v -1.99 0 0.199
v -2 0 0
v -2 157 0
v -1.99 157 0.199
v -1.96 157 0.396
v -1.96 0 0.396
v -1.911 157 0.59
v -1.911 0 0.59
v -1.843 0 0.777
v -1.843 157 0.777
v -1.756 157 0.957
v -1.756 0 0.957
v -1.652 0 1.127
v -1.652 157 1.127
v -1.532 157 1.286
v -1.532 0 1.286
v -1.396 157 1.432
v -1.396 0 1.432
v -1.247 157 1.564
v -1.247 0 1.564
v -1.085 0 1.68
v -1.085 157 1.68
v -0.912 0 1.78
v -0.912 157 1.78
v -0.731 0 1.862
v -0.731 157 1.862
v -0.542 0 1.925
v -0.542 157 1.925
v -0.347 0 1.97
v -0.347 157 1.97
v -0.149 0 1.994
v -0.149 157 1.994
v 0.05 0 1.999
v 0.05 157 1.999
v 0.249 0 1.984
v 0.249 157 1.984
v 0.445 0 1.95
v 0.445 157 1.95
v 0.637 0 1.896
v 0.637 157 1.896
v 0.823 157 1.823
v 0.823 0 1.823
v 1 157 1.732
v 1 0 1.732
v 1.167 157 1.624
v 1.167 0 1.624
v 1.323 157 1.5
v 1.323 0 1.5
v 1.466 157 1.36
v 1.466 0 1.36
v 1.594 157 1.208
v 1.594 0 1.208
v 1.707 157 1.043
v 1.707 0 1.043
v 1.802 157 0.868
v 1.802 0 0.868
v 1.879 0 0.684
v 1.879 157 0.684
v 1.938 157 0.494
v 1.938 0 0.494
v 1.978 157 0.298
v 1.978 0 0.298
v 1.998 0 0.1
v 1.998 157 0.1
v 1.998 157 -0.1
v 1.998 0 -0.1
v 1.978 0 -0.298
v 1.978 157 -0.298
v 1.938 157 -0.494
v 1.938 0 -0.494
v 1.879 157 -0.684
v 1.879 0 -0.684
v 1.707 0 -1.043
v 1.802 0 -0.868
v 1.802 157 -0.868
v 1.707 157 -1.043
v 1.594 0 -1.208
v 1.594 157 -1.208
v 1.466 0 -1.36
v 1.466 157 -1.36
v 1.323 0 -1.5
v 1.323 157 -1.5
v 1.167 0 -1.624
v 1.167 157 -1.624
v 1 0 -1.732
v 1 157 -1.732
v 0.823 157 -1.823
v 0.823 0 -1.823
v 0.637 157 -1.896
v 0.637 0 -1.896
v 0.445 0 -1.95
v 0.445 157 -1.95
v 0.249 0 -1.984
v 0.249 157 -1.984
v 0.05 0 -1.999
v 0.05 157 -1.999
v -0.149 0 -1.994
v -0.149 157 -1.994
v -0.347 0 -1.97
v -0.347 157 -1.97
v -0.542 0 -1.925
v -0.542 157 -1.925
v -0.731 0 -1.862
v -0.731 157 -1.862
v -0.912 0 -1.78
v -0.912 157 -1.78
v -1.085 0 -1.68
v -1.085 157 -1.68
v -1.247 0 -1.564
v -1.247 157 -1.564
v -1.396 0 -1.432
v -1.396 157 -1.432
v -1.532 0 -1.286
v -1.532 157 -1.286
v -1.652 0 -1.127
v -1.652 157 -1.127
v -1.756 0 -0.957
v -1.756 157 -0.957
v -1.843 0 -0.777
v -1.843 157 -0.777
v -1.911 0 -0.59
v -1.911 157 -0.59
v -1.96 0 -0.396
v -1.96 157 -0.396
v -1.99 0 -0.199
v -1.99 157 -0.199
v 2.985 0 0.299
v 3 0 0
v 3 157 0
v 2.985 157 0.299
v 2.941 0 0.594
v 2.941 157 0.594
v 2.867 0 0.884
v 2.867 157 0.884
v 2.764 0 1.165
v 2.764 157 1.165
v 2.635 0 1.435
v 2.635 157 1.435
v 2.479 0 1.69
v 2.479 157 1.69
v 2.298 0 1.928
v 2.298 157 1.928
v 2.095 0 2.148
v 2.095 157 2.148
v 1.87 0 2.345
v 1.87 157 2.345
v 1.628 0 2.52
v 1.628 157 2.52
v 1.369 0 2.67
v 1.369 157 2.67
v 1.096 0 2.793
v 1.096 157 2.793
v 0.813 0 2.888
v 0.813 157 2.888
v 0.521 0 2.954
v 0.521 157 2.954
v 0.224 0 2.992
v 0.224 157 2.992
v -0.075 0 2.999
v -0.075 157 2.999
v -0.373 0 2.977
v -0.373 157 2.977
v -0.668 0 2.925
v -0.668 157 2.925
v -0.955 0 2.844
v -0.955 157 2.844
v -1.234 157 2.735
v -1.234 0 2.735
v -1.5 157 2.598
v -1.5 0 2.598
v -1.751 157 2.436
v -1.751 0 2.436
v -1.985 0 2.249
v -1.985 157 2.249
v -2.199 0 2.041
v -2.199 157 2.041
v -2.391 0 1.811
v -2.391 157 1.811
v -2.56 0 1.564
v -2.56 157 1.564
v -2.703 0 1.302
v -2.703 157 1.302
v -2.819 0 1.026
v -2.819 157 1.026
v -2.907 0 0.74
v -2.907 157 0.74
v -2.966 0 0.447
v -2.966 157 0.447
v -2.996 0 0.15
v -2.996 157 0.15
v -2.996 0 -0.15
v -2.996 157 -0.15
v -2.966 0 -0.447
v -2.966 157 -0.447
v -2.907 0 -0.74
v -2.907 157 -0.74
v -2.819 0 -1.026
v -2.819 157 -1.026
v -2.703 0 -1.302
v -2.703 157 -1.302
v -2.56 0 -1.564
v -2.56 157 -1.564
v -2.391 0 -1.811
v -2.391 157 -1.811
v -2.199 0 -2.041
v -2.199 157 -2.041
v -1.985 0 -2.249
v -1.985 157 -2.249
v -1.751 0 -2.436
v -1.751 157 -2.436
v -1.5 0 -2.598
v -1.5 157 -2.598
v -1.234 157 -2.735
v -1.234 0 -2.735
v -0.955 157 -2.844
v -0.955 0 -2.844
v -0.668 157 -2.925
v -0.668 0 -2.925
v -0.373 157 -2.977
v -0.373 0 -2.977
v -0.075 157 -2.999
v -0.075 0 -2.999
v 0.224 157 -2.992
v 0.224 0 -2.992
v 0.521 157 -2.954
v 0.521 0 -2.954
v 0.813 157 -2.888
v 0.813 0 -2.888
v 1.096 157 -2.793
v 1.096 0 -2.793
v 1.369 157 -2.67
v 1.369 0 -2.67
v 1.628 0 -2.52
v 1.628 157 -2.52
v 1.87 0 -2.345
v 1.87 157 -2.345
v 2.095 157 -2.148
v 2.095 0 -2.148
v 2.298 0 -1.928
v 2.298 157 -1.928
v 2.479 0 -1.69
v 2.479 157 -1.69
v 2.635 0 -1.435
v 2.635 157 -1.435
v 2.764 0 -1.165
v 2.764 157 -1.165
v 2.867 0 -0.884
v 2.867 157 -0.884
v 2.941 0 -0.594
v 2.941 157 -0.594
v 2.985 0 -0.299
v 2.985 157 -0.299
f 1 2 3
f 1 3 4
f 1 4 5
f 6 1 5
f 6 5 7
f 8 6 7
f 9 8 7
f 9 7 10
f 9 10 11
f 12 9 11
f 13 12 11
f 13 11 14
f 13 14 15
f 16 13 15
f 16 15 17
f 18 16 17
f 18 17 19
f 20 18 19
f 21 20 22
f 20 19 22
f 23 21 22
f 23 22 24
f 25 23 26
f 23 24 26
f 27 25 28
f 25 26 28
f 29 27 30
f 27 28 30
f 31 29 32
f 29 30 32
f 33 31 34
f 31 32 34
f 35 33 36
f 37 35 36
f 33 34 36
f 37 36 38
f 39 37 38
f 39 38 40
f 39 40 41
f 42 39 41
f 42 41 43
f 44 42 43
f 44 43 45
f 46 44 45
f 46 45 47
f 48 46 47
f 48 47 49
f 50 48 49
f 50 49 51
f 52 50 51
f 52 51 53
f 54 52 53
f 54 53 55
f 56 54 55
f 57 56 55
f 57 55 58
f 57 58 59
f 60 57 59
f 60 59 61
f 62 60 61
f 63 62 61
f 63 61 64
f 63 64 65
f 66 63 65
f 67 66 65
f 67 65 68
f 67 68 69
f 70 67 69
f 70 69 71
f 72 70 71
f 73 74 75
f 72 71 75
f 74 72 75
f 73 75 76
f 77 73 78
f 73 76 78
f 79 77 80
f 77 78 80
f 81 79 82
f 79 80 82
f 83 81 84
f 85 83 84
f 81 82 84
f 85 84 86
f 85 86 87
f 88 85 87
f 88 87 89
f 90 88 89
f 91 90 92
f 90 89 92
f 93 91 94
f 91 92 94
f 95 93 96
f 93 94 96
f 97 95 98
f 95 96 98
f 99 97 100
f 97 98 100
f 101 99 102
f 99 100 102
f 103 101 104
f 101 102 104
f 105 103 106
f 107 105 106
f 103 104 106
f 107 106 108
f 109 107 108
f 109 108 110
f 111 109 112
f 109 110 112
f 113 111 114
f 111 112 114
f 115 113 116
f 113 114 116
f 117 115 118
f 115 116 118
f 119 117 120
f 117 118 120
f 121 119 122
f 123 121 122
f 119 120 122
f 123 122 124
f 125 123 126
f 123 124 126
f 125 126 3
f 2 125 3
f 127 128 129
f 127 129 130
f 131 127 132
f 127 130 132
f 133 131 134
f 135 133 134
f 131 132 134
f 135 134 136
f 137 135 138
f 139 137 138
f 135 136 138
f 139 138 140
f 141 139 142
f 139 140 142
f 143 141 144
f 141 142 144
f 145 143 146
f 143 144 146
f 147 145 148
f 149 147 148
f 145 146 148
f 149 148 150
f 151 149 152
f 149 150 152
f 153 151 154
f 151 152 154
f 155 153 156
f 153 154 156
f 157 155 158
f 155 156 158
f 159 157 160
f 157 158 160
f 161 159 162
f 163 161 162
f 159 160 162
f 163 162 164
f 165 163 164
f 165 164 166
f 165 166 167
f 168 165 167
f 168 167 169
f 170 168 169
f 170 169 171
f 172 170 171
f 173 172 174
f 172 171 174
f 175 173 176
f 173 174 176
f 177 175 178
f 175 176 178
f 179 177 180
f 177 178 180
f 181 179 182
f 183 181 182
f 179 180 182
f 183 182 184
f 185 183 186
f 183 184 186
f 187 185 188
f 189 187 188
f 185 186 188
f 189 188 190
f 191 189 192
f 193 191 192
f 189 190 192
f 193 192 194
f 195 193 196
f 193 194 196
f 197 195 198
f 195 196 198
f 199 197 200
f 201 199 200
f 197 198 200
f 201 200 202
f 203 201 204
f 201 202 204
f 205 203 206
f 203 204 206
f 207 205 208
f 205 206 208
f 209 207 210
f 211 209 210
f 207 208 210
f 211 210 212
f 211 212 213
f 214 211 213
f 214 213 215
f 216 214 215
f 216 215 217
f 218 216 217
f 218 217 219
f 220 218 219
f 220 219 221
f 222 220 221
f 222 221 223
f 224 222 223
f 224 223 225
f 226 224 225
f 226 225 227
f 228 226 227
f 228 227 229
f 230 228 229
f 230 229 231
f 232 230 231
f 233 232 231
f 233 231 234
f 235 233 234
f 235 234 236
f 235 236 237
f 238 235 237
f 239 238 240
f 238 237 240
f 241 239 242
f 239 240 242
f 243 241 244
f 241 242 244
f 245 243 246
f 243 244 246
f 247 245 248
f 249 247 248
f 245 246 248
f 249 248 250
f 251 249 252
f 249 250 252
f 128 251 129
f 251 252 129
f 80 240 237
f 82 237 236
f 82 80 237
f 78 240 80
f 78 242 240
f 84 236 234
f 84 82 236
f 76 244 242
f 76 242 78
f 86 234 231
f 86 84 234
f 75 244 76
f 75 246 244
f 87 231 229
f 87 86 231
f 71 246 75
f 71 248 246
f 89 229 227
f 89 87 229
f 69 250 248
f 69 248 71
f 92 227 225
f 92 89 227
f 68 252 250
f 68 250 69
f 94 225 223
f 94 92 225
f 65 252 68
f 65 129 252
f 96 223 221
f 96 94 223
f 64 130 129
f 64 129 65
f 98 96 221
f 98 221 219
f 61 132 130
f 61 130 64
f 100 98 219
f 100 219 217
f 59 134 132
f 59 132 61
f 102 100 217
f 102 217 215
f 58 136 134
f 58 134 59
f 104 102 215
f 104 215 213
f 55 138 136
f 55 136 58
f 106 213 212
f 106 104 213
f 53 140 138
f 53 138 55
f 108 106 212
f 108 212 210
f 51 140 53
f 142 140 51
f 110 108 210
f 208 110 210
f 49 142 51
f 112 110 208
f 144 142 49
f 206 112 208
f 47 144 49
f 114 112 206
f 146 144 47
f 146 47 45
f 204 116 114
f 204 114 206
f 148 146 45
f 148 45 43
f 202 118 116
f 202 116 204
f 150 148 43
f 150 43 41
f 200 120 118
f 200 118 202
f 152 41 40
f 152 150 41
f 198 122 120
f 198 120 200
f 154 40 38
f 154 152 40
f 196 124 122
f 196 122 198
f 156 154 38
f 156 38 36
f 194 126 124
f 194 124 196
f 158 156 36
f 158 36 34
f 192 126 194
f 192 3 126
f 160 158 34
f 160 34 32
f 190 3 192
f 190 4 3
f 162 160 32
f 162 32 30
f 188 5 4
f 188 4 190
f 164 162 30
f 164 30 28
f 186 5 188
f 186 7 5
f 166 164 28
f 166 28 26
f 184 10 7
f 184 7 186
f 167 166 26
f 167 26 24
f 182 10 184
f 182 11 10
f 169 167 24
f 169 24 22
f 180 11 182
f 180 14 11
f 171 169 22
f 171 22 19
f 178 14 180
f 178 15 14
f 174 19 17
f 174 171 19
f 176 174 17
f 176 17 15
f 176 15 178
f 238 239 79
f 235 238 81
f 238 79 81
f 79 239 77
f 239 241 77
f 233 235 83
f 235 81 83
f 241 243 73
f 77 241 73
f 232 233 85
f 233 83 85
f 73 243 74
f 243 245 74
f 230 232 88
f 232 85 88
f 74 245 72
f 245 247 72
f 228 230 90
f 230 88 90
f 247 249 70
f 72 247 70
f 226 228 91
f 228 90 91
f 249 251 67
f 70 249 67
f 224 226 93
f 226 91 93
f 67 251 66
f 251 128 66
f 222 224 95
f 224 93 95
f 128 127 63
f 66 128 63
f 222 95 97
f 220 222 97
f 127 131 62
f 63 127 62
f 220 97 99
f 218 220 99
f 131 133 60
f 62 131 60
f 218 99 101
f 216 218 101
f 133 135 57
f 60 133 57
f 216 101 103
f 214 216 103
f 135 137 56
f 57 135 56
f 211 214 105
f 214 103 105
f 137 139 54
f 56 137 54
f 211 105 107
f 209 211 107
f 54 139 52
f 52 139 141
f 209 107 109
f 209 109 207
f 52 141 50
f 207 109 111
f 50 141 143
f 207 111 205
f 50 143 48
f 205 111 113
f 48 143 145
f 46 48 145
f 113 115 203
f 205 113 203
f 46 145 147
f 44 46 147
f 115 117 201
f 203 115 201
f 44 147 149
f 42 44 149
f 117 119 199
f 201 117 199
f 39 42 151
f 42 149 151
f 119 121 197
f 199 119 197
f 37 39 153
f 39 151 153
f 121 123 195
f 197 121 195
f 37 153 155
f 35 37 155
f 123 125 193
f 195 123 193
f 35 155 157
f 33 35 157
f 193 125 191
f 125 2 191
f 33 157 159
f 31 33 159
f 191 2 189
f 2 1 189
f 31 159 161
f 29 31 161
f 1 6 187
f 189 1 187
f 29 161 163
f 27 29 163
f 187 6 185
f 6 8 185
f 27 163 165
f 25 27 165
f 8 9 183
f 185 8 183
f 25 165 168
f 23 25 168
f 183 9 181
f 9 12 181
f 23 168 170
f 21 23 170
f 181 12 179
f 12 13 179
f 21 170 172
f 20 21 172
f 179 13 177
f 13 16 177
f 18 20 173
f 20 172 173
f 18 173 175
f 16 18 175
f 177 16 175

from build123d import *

# Parameters (mm, degrees)
SKETCH1_W          = 3
SKETCH1_H          = 157
SKETCH3_R          = 2
CUT_EXTRUDE1_DEPTH = 158.097591383


with BuildPart() as part:
    # Sketch1 → Revolve1 (revolve)
    with BuildSketch(Plane.XY.offset(1.653301878)):
        with Locations((1.5, -78.5)):
            Rectangle(SKETCH1_W, SKETCH1_H)
    revolve(axis=Axis((0, 0, 1.653301878), (0, -1, 0)))

    # Sketch3 → Cut-Extrude1 (cut, through all)
    with BuildSketch(Plane(origin=(0, 0, 0), x_dir=(1, 0, 0), z_dir=(0, 1, 0))):
        with Locations(Location((0, -1.653301878, 0), (0, 0, 180))):
            Circle(SKETCH3_R)
    extrude(amount=-CUT_EXTRUDE1_DEPTH, mode=Mode.SUBTRACT)


with BuildPart() as part_1:
    # Body-Move/Copy1: read off the stored shape, not the designer's step
    # Body-Move/Copy1: moved
    add(part.part.moved(Location((0, 157, -1.6533019))))


solid = part_1.part
